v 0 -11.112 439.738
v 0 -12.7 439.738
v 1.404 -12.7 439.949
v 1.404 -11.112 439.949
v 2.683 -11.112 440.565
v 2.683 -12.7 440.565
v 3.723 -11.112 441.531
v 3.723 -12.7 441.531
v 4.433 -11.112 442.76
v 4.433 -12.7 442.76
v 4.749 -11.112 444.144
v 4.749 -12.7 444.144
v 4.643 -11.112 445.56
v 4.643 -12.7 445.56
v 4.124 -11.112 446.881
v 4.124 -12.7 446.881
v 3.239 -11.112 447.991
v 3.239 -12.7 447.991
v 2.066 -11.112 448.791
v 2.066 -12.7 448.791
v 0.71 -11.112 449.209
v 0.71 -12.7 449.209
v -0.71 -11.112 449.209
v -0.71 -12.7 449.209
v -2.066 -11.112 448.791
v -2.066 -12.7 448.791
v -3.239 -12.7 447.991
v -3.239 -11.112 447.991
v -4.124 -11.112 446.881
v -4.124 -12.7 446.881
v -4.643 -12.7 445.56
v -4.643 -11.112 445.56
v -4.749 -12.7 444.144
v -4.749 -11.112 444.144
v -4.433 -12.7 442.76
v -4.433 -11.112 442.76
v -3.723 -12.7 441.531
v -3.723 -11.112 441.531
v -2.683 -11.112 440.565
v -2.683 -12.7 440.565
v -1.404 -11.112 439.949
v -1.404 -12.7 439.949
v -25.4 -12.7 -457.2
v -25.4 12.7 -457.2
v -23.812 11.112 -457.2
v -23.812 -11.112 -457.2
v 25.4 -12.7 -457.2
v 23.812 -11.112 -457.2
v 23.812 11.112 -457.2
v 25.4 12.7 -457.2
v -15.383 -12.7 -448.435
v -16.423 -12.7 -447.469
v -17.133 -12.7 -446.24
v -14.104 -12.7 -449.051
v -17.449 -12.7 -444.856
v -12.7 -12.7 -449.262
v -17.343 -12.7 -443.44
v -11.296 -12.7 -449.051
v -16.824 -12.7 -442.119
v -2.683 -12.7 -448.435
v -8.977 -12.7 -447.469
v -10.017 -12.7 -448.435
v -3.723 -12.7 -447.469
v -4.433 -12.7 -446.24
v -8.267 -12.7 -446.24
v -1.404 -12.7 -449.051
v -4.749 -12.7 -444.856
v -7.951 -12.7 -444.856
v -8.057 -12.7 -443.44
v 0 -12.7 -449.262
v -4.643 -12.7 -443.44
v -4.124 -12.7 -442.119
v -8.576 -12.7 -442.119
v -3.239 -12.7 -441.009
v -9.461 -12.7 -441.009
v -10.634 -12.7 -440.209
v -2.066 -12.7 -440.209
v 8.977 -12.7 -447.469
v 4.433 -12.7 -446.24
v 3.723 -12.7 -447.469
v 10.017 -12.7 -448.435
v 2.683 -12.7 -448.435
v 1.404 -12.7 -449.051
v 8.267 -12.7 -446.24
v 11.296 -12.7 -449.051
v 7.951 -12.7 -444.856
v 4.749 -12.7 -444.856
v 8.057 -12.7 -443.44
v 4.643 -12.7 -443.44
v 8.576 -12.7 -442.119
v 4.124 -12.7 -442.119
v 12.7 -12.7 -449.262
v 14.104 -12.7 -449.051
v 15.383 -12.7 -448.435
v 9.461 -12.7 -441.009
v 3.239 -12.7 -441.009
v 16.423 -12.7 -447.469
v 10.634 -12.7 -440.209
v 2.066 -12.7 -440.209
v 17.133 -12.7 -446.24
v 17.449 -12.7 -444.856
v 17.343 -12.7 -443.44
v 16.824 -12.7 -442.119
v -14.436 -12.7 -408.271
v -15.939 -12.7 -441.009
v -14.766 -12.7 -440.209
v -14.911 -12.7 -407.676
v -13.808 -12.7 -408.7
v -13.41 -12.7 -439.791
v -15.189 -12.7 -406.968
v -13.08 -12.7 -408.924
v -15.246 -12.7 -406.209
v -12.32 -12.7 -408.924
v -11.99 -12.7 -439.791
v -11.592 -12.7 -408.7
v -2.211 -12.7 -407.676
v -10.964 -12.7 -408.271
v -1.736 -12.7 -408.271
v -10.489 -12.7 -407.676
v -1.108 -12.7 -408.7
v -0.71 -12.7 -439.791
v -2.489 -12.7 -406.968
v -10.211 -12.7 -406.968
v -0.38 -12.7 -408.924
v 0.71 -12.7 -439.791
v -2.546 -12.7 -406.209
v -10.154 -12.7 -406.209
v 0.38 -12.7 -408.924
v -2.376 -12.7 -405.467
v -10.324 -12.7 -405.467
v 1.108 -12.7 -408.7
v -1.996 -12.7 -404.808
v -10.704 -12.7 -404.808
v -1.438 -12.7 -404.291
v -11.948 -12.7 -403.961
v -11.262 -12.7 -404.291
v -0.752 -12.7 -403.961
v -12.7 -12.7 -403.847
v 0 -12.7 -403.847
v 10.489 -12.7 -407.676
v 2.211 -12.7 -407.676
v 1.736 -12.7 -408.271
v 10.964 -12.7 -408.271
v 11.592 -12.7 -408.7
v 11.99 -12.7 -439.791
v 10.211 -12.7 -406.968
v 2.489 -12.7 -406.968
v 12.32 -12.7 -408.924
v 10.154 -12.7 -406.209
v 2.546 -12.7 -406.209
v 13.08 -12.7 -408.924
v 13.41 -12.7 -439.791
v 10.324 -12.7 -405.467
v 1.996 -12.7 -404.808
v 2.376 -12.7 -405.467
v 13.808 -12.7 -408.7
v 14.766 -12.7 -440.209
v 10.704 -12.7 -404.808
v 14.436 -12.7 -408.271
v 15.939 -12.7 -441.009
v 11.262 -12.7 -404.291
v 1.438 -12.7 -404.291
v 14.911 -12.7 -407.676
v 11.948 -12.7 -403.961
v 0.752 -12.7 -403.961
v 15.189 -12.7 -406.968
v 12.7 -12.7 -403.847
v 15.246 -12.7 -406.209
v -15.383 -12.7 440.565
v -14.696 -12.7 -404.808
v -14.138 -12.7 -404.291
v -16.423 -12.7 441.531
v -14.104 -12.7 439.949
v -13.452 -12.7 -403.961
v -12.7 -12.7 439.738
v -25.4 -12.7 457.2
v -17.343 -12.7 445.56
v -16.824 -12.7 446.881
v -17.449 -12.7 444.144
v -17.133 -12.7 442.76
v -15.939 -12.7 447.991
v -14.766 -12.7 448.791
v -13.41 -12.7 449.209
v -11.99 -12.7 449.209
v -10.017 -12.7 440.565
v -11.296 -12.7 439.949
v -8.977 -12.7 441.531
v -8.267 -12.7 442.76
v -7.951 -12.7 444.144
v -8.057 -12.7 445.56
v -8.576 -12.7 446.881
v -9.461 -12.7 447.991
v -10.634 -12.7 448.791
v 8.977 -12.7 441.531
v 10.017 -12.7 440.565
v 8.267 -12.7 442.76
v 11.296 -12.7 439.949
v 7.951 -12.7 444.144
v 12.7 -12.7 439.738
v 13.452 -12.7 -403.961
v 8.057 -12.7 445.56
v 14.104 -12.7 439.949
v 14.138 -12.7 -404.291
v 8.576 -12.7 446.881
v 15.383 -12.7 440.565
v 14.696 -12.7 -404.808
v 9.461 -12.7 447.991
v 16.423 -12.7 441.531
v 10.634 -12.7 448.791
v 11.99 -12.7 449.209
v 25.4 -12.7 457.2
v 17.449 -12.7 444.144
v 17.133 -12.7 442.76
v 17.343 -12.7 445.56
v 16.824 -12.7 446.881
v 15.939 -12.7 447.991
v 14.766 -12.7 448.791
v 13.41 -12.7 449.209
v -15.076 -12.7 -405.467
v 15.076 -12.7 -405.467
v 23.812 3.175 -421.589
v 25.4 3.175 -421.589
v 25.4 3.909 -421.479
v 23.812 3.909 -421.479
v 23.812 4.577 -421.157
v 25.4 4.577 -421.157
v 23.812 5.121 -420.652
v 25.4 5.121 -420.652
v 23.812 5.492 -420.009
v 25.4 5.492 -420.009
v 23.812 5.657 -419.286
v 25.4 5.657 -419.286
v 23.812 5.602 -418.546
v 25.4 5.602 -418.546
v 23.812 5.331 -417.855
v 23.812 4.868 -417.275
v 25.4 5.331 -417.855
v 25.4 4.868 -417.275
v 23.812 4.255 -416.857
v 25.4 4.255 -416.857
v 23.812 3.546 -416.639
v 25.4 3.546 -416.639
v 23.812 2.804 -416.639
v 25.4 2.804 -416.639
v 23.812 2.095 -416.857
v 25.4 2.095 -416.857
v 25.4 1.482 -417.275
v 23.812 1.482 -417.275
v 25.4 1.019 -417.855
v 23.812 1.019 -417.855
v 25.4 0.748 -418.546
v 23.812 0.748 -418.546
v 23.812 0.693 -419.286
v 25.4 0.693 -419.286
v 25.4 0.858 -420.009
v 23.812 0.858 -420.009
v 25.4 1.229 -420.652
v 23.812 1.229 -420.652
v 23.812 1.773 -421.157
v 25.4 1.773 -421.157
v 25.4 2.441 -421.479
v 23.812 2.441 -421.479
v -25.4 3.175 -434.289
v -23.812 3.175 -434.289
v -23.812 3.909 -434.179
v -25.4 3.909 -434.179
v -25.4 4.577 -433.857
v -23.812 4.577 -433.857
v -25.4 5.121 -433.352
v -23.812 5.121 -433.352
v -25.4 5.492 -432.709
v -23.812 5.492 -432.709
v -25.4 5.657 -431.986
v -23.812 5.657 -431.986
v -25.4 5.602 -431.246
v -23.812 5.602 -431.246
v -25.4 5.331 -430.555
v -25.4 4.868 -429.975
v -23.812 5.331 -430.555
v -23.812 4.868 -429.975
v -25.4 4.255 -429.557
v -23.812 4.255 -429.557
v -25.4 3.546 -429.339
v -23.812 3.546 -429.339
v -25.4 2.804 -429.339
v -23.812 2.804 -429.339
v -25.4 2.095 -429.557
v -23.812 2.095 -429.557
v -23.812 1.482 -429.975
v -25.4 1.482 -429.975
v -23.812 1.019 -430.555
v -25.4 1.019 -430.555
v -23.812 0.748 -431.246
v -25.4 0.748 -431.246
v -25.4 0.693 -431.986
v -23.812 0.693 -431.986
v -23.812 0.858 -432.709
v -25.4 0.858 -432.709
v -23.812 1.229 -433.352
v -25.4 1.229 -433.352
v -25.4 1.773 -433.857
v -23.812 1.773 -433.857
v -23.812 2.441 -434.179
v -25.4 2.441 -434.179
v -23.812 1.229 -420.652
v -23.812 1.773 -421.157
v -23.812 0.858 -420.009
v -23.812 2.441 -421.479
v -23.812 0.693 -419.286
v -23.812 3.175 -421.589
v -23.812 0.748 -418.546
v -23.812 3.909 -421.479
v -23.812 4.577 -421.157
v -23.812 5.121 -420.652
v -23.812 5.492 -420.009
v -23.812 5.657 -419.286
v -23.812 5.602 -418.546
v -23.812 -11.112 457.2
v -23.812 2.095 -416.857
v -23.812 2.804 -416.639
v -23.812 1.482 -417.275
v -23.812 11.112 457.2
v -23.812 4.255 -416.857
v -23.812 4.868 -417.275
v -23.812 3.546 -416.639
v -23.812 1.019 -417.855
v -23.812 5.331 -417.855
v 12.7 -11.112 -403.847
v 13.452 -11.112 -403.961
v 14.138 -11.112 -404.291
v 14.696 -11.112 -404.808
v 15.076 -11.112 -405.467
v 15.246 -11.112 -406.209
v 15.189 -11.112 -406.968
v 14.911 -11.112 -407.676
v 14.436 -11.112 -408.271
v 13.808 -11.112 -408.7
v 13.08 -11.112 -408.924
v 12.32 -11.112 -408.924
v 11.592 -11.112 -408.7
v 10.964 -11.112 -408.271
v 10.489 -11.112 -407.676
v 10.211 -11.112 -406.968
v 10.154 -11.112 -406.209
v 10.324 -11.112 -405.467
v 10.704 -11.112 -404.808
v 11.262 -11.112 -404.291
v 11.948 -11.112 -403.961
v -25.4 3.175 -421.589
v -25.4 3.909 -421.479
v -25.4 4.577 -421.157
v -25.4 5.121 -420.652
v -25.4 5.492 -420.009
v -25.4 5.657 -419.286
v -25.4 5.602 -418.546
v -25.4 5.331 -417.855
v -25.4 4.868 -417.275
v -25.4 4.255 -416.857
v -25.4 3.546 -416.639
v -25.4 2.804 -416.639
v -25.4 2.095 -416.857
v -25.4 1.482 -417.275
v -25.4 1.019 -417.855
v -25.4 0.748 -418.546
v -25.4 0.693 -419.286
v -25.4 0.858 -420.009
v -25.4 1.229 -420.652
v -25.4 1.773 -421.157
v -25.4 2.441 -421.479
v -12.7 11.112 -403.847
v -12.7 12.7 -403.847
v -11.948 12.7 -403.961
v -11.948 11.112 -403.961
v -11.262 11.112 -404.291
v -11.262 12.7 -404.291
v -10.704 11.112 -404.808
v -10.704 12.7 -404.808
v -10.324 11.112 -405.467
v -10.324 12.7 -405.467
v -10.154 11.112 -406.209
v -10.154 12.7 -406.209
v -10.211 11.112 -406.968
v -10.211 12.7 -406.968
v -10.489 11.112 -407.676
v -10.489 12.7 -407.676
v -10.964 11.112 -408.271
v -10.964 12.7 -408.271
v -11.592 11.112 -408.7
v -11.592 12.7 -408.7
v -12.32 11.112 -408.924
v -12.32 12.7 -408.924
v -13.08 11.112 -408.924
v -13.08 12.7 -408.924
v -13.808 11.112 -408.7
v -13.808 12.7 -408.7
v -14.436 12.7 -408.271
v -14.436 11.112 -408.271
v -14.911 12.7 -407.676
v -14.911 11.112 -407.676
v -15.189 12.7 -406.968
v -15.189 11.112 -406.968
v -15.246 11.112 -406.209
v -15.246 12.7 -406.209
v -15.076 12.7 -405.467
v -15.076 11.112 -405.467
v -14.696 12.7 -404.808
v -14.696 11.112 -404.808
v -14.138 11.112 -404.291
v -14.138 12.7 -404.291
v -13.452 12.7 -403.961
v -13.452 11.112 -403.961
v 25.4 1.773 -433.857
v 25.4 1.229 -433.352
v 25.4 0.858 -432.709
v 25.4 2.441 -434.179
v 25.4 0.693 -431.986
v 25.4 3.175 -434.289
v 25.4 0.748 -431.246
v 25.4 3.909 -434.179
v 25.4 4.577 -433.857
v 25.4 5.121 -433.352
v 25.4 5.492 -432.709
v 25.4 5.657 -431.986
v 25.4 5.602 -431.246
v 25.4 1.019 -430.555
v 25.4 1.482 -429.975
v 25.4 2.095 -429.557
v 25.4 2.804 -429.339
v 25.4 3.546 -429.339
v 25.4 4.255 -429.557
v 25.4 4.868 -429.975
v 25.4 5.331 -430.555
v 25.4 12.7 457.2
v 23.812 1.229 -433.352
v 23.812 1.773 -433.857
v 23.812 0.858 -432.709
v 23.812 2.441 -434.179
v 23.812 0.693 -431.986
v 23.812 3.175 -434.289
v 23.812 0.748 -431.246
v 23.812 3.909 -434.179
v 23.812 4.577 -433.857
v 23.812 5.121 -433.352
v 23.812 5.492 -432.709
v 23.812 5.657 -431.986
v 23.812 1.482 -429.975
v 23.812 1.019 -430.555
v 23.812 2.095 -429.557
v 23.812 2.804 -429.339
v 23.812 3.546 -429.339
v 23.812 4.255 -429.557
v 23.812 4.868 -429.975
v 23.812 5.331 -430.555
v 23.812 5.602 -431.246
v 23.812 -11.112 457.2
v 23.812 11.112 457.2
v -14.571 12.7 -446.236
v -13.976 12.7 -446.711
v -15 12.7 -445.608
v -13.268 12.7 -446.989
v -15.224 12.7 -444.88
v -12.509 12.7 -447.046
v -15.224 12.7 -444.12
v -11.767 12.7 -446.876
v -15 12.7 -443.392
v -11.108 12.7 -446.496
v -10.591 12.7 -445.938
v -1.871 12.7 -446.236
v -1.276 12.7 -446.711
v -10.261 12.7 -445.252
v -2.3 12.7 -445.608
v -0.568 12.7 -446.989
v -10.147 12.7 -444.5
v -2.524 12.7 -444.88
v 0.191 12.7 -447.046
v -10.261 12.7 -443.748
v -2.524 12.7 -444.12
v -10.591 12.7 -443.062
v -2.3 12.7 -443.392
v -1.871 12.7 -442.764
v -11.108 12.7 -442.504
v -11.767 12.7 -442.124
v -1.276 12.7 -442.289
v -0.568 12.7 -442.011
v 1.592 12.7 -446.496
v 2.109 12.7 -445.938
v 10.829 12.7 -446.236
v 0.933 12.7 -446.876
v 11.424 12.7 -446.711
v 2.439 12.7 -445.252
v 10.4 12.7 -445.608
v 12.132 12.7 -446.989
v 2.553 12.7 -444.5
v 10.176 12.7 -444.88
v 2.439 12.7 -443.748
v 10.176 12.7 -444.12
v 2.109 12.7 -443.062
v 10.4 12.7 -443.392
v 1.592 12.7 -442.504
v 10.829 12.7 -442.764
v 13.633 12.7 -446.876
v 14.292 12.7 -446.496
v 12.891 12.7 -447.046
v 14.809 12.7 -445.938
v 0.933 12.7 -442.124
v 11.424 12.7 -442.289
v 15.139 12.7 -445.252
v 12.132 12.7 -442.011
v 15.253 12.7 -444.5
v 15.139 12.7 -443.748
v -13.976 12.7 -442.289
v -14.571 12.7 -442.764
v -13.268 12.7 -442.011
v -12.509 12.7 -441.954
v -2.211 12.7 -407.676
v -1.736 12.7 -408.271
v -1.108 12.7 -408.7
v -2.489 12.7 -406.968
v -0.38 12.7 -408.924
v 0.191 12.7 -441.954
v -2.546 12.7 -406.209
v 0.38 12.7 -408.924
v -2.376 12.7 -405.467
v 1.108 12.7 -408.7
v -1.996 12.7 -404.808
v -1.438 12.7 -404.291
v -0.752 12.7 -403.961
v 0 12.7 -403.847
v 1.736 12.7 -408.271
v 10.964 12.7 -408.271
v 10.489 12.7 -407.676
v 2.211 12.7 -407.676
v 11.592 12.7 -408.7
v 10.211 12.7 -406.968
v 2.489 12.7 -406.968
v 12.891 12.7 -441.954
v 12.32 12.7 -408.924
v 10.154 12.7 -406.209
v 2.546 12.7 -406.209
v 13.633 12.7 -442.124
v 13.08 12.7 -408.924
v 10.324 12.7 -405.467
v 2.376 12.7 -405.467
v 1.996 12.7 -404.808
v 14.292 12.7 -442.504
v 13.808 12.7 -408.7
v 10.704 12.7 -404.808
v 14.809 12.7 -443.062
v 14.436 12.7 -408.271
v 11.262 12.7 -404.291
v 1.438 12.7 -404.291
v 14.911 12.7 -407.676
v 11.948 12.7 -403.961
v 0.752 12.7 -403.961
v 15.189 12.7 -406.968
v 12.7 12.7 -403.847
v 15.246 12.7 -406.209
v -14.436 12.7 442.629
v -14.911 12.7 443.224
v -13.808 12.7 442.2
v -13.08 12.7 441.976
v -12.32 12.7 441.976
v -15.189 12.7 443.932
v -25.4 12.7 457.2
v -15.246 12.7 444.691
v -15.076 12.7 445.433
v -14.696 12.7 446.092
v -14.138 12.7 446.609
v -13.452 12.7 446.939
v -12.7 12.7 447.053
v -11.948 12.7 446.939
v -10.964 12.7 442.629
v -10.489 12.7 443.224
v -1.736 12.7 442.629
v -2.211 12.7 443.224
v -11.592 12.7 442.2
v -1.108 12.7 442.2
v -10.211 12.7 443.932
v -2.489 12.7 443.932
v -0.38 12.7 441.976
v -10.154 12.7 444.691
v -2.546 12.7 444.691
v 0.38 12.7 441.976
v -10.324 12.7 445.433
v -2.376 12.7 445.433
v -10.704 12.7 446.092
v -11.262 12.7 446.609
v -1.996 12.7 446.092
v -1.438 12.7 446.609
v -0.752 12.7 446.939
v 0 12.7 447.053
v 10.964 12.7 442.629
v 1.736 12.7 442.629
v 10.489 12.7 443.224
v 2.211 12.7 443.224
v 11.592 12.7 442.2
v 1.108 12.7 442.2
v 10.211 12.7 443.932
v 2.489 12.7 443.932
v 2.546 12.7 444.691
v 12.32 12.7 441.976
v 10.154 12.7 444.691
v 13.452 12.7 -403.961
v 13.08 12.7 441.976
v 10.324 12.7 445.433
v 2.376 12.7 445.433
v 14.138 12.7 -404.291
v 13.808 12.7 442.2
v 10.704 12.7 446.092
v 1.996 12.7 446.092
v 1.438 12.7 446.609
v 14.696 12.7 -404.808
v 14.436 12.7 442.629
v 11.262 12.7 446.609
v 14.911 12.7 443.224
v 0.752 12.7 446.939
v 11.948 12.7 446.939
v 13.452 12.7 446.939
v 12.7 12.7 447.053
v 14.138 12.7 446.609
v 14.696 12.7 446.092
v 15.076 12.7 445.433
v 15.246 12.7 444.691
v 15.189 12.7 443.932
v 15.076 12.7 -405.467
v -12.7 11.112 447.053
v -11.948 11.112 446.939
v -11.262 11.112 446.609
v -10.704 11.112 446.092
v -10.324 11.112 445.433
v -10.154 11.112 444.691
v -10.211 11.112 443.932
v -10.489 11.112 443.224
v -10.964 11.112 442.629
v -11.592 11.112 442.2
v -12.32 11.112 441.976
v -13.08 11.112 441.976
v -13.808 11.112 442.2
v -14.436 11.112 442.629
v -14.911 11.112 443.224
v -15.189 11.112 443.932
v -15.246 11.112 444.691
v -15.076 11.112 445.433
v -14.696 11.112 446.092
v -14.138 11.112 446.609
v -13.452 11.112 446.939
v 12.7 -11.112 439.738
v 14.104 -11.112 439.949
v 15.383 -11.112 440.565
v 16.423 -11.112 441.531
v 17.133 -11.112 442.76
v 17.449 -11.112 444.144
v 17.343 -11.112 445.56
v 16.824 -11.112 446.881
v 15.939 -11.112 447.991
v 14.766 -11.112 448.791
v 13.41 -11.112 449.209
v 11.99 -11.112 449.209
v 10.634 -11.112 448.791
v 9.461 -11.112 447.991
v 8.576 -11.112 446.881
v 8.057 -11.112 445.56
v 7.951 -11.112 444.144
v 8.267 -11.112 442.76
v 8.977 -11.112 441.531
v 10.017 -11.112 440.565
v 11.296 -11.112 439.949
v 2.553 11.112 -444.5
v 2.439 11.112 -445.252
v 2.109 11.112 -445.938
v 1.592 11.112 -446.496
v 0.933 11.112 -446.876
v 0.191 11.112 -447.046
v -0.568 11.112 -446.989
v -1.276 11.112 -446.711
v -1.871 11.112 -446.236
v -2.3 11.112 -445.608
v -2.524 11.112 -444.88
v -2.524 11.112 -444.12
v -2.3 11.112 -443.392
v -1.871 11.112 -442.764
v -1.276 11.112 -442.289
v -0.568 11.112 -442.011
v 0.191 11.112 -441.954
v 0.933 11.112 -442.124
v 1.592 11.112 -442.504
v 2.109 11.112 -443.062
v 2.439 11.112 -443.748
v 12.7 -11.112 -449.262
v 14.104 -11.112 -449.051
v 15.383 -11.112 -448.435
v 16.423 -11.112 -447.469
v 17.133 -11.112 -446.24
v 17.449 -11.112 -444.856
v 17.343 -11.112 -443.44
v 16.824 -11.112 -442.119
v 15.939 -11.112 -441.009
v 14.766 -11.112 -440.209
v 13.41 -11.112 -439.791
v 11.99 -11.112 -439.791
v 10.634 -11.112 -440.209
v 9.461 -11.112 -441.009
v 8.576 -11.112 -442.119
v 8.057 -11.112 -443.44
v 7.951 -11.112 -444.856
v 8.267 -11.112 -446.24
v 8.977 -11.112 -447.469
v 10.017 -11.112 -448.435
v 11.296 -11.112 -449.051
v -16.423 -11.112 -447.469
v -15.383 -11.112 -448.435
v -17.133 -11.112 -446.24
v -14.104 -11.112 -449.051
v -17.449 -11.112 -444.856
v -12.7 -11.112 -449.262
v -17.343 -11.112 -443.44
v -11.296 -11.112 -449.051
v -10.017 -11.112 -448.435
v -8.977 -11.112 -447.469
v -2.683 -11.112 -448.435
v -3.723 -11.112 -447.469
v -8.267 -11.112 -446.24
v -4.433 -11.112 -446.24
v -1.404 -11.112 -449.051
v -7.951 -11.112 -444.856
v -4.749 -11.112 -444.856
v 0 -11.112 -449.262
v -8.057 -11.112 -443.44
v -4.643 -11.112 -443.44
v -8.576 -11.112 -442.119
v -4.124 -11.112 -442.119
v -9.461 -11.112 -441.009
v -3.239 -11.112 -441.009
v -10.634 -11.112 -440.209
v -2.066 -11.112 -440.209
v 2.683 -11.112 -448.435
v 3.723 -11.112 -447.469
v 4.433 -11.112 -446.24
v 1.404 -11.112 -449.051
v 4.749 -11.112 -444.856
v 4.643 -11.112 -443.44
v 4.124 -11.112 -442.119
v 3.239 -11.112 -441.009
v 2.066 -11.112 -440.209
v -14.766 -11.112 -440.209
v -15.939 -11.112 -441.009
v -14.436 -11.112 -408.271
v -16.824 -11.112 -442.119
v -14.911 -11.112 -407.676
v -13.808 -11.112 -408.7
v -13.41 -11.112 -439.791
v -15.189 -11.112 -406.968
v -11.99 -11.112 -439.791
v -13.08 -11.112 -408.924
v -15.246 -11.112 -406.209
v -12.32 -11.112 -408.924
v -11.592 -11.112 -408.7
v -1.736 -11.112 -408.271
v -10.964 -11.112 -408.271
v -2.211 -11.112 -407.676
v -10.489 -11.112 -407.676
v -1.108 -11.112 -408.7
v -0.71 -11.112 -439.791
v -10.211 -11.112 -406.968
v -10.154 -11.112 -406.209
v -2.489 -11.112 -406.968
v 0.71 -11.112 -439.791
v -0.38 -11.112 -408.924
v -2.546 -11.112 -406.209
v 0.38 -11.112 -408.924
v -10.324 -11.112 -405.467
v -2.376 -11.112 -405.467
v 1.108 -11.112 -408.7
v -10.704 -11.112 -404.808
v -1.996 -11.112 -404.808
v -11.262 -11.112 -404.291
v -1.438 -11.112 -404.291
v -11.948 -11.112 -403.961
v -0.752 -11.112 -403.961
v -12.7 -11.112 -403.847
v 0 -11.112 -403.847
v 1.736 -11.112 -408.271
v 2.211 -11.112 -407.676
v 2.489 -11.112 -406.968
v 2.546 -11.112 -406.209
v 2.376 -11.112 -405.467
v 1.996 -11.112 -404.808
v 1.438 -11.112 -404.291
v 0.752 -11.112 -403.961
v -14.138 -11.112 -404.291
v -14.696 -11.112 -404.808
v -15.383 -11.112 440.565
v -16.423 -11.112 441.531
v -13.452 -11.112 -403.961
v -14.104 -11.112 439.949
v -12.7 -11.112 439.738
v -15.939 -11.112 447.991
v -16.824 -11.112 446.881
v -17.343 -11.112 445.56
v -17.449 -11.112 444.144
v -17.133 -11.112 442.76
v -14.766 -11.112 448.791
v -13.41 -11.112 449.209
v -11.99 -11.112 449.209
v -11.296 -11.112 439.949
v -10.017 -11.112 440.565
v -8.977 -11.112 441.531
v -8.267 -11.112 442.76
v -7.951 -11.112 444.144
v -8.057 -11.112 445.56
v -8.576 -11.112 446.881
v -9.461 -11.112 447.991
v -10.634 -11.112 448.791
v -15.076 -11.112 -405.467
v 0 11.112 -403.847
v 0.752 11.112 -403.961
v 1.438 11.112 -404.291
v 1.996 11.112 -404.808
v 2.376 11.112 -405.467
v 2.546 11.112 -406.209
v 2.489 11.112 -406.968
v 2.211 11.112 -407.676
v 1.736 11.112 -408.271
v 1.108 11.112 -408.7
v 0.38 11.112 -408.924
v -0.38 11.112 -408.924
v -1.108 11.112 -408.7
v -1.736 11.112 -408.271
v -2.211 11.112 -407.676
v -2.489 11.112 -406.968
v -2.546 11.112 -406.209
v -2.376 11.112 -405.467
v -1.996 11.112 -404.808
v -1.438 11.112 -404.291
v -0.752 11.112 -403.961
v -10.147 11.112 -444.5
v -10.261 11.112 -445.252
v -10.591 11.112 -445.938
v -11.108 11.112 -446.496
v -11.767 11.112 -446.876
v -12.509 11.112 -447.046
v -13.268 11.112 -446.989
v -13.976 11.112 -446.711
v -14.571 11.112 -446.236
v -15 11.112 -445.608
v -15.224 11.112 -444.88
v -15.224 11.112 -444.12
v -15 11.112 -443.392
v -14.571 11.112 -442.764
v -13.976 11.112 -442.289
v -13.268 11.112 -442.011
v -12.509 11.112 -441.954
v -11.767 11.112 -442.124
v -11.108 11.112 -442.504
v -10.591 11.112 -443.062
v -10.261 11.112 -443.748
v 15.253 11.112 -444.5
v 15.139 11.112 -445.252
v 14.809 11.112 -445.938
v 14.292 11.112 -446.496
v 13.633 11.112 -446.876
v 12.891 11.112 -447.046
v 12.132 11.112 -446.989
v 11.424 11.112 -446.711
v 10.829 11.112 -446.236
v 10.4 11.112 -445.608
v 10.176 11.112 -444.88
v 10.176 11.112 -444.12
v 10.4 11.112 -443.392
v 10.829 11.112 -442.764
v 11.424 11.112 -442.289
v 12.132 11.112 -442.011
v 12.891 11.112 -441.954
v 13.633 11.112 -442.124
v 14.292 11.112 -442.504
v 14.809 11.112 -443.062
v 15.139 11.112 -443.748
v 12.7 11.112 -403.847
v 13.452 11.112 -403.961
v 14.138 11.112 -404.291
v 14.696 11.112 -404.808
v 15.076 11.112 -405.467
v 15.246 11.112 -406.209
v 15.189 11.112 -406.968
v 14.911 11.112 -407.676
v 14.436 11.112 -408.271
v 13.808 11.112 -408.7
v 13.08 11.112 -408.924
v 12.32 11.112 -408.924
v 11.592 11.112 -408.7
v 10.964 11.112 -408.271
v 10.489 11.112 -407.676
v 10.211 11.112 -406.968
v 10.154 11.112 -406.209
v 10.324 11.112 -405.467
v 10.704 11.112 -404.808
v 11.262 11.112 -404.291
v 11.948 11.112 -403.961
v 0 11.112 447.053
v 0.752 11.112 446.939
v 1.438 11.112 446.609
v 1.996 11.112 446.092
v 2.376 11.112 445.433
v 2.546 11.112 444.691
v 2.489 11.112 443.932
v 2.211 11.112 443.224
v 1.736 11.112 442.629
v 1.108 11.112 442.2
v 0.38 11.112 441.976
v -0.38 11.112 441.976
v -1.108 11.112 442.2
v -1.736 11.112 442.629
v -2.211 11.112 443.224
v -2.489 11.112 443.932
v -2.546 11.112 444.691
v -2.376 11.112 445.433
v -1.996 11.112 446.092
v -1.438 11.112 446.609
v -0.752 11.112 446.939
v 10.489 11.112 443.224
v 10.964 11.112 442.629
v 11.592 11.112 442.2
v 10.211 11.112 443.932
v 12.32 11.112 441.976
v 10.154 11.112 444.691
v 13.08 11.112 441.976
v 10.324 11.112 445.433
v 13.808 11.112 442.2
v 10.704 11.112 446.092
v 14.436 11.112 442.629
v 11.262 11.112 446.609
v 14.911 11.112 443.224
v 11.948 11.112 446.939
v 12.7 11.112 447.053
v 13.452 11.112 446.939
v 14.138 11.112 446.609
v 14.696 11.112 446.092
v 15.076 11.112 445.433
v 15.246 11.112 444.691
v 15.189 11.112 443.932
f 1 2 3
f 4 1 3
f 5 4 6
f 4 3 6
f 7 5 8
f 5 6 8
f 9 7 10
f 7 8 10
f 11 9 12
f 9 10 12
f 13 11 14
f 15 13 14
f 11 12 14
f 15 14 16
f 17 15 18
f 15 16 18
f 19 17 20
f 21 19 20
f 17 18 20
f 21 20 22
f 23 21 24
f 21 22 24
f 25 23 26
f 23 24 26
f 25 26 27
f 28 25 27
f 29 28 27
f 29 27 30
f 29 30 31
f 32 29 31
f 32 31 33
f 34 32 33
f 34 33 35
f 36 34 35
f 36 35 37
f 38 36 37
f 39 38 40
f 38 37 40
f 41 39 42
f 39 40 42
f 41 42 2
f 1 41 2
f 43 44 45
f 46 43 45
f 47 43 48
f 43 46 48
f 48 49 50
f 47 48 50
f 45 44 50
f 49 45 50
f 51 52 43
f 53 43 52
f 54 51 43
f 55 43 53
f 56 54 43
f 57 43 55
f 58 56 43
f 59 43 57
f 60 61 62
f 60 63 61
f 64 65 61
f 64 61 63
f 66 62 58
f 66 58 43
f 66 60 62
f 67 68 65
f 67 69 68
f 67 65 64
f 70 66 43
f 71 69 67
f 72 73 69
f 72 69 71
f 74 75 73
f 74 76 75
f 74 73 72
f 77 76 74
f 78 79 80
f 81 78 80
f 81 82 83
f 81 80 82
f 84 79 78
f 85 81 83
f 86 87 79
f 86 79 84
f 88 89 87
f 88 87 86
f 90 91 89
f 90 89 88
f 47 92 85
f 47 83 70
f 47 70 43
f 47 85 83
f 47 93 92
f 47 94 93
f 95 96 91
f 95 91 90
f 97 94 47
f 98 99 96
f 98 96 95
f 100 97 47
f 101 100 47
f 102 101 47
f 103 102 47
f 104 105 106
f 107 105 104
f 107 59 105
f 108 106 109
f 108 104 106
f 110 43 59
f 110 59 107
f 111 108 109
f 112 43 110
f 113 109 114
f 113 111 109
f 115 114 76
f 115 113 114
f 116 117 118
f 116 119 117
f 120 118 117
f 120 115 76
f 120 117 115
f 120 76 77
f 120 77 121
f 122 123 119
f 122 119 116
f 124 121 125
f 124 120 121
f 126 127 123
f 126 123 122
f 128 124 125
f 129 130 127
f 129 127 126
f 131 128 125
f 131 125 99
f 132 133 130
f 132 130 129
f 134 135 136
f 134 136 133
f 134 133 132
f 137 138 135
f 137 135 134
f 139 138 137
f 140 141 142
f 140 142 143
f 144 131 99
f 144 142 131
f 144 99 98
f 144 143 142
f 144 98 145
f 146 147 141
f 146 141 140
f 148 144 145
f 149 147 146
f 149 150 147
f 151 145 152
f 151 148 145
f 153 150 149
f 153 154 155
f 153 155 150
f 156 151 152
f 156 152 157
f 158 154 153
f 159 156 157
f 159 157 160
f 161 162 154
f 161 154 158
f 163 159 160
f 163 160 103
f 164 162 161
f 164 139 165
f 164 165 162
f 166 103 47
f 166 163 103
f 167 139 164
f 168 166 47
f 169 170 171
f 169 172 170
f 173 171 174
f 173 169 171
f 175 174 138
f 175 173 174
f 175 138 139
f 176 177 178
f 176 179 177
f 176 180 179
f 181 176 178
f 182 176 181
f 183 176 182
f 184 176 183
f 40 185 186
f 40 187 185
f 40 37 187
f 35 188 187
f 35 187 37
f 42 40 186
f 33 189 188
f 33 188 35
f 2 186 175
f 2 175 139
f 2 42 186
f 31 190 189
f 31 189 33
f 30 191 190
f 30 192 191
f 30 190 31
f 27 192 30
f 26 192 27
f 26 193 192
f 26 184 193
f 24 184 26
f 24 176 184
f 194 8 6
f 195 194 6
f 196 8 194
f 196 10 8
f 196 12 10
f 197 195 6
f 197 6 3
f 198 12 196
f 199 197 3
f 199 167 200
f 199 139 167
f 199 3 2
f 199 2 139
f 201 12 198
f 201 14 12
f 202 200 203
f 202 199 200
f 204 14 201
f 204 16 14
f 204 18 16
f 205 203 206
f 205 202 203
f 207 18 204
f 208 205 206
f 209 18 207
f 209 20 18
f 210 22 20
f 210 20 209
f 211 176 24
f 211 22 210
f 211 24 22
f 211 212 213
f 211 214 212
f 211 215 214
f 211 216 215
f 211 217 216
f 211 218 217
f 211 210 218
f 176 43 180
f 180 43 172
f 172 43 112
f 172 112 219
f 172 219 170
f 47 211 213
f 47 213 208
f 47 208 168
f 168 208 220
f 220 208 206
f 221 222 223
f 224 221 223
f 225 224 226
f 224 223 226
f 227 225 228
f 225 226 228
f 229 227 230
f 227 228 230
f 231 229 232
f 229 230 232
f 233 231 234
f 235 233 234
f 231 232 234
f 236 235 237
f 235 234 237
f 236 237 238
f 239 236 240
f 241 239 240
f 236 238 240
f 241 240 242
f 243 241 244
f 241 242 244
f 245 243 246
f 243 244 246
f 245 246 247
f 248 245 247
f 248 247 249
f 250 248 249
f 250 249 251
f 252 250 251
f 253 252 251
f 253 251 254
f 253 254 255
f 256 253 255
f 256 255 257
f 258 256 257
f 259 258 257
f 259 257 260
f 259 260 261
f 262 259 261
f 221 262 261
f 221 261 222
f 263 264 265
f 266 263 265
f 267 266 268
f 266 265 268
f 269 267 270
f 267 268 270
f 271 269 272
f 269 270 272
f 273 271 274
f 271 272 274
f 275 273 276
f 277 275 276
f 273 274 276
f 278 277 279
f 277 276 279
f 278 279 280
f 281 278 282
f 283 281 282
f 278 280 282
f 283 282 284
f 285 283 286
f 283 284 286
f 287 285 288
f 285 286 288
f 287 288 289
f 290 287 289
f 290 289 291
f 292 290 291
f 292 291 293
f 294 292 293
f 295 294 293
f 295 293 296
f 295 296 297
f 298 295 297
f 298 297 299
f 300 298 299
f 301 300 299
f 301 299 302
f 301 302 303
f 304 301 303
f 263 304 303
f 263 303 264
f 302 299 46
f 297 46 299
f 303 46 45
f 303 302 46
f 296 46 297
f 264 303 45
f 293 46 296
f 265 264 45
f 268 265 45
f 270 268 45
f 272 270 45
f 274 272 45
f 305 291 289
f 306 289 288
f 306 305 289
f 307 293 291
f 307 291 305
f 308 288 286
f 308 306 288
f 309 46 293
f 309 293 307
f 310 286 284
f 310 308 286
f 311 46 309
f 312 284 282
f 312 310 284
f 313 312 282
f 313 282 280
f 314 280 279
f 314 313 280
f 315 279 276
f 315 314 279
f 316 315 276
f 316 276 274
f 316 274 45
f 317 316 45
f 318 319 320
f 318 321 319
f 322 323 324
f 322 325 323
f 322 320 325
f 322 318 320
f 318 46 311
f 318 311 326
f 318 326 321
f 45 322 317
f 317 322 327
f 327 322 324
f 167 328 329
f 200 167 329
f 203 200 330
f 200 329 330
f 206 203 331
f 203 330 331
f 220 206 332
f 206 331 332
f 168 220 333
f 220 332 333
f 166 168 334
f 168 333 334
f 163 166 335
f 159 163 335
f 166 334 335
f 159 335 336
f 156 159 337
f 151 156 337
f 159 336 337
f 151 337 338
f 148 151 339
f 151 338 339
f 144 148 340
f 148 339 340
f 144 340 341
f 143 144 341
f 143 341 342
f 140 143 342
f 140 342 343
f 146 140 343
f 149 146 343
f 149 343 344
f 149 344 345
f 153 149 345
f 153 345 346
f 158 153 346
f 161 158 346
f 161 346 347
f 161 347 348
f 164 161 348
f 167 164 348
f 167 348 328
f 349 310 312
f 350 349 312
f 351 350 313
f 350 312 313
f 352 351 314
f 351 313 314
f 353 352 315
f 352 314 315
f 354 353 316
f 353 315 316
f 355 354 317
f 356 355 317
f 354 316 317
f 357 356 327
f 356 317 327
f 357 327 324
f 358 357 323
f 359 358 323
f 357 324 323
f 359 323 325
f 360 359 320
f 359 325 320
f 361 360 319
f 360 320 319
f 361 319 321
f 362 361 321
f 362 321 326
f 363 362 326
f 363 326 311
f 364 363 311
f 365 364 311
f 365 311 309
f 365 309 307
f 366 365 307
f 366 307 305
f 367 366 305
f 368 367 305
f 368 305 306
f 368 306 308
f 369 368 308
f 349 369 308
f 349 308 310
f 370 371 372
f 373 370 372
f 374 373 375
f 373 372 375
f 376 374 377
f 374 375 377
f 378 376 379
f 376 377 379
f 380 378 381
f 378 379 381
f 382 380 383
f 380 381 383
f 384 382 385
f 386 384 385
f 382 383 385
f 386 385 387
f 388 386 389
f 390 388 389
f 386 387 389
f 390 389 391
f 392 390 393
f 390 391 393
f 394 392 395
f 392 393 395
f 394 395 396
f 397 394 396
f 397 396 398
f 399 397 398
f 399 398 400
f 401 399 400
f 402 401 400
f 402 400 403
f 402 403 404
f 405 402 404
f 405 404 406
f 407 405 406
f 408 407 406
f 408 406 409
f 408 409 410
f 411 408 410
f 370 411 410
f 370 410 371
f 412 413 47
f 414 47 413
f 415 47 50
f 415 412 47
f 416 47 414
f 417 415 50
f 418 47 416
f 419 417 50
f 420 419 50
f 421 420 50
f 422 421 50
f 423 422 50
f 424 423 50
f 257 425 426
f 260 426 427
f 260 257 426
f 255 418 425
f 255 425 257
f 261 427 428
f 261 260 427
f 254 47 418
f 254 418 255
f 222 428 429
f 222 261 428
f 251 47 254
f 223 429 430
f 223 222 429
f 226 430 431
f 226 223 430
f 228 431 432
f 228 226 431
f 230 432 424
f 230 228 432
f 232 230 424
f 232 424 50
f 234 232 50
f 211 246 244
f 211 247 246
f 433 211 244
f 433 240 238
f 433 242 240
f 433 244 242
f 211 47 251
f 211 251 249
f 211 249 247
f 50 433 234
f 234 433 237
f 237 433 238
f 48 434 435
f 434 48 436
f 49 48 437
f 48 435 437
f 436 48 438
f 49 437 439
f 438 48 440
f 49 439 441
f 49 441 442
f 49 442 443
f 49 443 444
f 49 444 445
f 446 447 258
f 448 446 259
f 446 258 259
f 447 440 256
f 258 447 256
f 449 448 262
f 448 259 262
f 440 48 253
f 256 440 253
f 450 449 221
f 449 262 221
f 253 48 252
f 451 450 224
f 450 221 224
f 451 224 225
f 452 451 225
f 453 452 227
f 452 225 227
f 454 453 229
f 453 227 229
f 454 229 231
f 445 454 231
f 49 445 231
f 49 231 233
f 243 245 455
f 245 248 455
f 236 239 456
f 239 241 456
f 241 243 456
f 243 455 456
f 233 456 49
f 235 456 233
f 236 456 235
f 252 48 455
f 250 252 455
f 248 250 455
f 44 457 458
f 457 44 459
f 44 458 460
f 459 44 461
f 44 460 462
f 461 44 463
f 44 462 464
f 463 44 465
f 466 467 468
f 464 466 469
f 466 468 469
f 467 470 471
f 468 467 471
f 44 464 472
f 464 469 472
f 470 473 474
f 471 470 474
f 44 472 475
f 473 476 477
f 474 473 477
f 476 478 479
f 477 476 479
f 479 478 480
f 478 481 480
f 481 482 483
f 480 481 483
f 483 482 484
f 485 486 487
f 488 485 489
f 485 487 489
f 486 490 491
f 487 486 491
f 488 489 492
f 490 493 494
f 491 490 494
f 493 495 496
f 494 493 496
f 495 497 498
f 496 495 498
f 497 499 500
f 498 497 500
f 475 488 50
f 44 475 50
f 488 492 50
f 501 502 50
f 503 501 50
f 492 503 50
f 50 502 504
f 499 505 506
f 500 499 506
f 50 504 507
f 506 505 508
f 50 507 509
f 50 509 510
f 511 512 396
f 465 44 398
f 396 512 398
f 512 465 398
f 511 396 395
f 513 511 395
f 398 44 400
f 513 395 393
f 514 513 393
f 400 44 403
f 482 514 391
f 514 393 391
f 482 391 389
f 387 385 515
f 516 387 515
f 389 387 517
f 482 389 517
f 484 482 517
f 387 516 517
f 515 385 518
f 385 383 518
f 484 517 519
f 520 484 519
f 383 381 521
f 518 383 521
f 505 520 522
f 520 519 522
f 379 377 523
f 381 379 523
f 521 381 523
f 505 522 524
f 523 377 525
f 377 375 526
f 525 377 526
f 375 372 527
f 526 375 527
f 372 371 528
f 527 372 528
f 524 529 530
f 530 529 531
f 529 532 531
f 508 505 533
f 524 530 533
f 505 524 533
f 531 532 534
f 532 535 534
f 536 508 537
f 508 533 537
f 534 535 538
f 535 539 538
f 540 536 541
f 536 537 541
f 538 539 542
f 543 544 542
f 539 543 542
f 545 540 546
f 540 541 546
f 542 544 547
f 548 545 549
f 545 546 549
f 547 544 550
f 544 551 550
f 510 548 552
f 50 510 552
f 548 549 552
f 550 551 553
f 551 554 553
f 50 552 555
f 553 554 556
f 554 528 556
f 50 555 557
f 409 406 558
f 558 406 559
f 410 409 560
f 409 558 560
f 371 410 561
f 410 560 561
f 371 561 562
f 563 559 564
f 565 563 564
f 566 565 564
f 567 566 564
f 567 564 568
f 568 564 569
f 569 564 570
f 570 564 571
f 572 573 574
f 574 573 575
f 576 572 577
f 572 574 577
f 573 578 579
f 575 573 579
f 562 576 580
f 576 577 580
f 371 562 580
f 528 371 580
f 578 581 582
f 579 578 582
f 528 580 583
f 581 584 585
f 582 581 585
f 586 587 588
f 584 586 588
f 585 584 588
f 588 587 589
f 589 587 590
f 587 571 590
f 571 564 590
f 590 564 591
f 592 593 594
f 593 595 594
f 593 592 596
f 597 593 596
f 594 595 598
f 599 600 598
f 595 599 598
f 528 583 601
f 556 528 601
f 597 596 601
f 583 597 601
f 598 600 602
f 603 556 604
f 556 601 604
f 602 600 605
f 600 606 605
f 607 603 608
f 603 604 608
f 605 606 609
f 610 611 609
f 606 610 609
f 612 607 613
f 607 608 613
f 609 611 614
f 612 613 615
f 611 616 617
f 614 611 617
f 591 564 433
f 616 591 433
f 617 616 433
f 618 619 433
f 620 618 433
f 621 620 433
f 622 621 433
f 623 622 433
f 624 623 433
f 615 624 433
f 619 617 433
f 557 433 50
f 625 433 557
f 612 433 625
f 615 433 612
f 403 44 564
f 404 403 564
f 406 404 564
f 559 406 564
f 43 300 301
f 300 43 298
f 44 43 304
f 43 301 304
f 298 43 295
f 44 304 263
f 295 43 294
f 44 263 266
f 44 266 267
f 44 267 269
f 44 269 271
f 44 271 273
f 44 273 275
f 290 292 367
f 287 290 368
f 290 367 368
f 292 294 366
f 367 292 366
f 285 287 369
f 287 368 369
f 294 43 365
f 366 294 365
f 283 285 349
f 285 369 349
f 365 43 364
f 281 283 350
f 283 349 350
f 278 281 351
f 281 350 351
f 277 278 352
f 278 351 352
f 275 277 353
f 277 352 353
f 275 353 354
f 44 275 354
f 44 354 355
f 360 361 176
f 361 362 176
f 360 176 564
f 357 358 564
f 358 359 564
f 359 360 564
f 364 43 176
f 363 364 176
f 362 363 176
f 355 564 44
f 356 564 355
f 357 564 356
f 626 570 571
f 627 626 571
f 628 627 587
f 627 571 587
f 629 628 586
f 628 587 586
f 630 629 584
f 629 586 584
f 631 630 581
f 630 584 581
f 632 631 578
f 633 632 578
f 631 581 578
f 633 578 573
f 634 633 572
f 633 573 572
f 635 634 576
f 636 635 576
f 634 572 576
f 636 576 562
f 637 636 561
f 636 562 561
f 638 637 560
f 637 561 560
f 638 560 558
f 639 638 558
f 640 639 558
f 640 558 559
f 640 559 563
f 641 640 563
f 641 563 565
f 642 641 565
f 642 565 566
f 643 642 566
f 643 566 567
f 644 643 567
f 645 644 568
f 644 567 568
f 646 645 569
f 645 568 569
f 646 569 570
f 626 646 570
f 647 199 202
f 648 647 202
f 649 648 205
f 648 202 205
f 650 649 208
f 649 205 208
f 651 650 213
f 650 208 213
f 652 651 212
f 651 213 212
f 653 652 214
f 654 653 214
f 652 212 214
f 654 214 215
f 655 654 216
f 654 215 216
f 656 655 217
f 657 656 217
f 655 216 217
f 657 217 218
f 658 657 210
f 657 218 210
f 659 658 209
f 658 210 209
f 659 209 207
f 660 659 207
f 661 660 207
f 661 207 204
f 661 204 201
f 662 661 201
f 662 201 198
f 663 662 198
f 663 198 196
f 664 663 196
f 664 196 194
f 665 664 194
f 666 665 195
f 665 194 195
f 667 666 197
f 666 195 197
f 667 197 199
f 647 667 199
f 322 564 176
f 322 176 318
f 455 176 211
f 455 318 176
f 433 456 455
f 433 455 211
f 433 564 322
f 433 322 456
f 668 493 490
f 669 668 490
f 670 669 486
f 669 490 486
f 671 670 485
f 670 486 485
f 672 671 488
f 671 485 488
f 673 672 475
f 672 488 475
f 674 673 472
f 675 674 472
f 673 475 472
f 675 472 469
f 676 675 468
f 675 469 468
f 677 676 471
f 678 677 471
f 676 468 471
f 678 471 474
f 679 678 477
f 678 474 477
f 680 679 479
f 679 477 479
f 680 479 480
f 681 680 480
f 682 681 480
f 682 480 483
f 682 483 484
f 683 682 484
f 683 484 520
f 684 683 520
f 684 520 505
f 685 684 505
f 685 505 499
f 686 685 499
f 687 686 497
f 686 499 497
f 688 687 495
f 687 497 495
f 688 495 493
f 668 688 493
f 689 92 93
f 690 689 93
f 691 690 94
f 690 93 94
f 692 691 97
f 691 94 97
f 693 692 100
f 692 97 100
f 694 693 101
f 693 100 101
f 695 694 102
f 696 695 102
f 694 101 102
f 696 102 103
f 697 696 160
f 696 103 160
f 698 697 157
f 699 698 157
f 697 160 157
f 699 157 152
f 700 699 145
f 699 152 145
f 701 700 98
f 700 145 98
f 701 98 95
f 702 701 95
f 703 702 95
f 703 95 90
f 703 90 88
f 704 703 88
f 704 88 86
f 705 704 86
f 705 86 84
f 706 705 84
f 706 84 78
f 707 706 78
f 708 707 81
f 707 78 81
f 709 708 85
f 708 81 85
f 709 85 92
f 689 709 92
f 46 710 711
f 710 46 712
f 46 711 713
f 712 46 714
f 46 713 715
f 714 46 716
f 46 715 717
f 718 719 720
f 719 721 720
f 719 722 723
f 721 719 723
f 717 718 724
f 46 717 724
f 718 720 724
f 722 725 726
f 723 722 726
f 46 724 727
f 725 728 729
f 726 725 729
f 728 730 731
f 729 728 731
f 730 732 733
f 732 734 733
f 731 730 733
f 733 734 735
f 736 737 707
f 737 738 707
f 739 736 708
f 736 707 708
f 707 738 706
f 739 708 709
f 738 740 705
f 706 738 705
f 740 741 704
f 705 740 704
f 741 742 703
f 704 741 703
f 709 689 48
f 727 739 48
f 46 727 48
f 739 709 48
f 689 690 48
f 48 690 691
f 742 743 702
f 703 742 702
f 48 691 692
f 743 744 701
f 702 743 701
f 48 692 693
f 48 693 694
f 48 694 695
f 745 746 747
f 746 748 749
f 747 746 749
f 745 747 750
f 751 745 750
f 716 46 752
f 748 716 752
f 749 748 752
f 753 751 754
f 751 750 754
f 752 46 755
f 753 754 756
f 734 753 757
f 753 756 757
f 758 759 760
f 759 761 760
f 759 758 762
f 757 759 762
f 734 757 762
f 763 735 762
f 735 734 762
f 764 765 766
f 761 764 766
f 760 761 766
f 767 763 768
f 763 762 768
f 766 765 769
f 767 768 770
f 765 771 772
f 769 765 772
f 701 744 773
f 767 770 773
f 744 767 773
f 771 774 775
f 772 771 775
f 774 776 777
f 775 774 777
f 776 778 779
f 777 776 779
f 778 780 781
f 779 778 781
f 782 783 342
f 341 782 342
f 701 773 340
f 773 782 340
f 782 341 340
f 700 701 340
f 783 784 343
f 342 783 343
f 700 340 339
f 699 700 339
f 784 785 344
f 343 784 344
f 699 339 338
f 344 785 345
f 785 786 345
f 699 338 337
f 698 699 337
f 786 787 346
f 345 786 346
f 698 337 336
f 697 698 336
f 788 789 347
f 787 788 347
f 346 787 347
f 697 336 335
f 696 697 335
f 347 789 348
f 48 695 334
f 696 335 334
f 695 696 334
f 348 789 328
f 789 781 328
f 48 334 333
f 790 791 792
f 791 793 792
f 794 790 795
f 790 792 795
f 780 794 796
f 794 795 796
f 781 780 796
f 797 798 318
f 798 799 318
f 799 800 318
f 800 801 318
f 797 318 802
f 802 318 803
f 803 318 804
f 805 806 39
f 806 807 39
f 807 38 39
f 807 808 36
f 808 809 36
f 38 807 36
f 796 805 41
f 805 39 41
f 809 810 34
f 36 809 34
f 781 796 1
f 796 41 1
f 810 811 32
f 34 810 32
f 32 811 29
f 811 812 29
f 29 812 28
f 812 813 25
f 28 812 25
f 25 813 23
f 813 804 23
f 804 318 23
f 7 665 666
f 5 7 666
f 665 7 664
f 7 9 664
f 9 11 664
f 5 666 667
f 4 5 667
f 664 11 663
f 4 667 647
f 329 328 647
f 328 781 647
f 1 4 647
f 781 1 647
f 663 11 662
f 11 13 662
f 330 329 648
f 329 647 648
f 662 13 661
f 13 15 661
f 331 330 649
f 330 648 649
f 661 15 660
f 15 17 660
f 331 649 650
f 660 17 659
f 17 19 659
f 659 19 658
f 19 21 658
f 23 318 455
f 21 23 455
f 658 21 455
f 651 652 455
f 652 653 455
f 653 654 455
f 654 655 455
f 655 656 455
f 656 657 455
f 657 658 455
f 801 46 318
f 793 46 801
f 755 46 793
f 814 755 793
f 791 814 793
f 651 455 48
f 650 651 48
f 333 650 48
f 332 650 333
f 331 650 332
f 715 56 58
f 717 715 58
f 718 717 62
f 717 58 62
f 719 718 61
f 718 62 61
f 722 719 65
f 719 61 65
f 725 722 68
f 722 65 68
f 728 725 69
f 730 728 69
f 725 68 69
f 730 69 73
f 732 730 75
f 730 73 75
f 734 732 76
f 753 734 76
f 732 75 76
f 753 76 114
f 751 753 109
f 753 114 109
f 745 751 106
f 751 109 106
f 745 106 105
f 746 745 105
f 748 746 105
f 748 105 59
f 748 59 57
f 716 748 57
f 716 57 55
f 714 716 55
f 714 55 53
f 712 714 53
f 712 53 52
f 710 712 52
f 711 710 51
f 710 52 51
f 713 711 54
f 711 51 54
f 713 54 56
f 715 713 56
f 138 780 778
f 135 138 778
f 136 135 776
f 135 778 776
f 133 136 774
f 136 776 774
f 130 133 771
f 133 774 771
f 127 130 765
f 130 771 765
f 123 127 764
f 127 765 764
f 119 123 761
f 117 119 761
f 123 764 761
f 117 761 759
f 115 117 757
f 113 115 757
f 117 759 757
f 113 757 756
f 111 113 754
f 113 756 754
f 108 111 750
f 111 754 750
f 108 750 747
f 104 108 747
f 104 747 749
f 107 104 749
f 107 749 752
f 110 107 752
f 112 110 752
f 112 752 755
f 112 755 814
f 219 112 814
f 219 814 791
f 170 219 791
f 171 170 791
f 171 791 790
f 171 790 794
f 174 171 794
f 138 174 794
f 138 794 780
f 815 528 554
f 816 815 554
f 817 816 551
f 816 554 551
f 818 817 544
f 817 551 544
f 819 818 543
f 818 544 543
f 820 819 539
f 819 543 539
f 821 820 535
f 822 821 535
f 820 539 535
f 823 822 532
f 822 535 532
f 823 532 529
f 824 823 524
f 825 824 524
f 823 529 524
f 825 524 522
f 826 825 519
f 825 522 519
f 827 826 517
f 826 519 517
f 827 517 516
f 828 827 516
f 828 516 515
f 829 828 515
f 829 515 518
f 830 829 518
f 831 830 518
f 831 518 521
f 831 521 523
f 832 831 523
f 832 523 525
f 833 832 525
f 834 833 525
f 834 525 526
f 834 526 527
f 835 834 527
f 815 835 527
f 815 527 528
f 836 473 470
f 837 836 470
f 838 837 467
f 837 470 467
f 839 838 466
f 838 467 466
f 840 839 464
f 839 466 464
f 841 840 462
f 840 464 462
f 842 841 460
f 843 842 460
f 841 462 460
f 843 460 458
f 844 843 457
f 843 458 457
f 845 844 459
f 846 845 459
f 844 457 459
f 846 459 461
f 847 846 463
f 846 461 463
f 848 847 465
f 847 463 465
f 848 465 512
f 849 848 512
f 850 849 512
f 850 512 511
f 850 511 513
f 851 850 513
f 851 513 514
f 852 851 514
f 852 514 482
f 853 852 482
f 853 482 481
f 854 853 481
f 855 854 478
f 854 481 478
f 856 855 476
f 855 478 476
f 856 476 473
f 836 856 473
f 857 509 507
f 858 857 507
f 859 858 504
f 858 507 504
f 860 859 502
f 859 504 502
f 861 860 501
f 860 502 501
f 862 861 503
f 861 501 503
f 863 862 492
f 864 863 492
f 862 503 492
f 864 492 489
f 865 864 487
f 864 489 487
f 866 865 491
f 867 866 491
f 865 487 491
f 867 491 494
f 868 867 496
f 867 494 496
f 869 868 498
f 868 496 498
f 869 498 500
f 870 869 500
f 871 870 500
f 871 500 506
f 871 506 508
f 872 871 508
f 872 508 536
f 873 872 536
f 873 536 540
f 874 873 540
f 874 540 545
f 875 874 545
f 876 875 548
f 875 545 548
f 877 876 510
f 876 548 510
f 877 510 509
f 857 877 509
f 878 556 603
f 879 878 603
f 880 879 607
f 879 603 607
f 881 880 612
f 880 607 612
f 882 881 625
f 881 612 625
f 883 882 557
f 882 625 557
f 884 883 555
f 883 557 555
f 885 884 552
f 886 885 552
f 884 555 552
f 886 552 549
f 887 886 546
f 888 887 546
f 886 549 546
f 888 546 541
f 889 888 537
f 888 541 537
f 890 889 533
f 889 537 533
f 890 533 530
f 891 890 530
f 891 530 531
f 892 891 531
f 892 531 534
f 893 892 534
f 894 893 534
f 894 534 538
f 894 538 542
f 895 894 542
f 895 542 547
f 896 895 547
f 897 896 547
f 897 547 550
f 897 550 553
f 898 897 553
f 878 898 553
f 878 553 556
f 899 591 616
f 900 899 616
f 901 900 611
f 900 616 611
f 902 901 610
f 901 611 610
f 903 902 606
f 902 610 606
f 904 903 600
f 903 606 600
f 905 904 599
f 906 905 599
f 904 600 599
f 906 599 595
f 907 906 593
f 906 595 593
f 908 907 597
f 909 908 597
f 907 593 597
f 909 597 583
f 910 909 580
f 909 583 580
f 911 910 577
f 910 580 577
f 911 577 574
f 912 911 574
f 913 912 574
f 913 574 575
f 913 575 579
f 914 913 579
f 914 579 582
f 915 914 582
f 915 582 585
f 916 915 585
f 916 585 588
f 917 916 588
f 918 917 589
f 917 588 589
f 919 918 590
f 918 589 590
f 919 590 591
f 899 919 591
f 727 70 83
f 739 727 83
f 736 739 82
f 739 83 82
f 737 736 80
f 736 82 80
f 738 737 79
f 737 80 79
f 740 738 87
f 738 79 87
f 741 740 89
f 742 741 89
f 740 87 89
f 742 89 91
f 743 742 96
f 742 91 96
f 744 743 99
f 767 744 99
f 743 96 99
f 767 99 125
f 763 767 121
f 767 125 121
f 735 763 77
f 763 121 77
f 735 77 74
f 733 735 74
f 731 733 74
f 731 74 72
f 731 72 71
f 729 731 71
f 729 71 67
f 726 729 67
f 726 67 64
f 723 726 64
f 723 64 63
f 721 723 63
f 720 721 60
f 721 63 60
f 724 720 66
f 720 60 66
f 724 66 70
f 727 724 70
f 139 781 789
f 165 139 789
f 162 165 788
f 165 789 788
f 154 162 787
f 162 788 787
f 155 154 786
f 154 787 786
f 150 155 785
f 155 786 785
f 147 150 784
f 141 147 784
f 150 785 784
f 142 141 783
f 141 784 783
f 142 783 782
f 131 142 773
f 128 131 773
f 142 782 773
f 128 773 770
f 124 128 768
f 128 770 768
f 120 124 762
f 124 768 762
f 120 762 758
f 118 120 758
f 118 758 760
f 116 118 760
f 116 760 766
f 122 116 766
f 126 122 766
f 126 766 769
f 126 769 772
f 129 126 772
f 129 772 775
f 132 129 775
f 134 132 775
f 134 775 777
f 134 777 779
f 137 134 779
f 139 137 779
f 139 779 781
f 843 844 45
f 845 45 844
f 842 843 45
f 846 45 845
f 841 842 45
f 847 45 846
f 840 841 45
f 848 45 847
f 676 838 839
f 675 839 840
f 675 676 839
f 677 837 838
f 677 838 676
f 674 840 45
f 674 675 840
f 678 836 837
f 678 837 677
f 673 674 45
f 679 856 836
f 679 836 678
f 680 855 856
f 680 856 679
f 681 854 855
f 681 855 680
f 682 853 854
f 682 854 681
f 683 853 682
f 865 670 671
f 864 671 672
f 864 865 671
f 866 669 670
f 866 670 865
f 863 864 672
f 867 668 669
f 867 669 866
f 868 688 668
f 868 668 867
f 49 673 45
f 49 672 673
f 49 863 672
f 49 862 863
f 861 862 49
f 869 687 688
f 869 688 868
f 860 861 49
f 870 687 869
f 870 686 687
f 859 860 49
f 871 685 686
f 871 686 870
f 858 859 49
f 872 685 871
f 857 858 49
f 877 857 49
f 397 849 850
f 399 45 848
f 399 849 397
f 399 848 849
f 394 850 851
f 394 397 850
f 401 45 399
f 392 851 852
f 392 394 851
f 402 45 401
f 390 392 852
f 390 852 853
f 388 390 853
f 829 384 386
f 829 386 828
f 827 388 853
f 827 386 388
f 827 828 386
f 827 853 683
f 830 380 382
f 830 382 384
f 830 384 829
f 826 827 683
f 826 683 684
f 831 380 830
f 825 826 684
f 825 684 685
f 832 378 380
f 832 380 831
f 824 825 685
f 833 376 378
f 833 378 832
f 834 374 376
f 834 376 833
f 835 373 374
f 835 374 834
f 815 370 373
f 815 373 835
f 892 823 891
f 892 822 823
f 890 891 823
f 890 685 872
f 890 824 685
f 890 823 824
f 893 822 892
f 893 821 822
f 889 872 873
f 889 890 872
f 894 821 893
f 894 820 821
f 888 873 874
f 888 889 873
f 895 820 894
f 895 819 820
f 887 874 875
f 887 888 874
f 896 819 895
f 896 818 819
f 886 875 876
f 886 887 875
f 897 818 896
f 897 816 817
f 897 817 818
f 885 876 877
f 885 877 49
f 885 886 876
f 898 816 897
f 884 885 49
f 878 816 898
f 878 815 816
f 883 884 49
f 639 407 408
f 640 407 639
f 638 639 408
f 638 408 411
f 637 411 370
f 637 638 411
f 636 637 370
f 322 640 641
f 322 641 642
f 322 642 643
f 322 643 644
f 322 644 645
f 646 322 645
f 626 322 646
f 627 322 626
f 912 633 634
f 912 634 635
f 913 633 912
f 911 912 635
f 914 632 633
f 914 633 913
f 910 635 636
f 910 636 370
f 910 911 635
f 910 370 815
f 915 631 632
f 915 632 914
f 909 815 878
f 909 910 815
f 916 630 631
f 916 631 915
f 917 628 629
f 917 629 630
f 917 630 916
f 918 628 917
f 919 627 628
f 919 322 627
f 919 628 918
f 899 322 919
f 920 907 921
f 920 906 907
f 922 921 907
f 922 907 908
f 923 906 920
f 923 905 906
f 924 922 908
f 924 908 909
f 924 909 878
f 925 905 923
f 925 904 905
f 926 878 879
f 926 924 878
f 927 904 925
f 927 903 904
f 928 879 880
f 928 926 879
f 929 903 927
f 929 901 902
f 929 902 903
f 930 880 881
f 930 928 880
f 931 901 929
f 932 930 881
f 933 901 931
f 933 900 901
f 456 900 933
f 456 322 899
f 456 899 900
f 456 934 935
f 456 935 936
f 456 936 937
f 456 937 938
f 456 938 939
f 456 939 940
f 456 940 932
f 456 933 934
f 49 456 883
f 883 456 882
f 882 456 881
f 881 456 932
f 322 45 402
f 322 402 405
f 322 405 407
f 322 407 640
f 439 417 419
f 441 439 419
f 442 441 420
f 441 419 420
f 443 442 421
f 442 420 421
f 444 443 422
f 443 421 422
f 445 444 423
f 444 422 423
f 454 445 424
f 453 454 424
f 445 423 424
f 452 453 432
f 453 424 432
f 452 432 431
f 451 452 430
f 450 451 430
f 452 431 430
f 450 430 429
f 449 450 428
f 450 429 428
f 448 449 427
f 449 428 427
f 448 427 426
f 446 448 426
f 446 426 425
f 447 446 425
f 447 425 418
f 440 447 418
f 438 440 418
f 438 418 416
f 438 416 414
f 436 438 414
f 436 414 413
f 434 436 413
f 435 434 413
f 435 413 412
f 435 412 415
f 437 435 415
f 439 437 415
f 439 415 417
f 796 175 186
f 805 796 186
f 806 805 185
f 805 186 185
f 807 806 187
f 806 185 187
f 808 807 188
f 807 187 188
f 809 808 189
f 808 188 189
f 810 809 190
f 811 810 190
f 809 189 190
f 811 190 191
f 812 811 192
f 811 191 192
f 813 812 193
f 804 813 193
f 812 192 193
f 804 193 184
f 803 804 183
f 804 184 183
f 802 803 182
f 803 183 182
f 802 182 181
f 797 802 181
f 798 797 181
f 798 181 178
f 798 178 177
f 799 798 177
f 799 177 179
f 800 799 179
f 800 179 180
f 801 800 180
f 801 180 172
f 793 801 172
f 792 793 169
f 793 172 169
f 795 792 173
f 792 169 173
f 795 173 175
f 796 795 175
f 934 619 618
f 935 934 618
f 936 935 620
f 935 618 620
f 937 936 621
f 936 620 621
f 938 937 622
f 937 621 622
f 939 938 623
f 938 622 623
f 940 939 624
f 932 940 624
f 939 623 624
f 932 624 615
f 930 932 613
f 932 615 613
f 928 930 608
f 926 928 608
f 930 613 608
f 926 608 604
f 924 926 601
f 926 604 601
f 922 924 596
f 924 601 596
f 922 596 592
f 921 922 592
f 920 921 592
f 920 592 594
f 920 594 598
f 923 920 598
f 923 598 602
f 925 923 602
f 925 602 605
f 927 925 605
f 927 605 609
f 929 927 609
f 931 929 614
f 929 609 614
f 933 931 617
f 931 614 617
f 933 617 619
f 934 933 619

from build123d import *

# Parameters (mm, degrees)
SKETCH1_W           = 50.8
SKETCH1_H           = 25.4
SKETCH1_W_2         = 47.625
SKETCH1_H_2         = 22.225
BOSS_EXTRUDE1_DEPTH = 457.2
SKETCH3_R           = 2.5527
CUT_EXTRUDE2_DEPTH  = 1.5875
SKETCH4_R           = 4.7625
SKETCH4_R_2         = 2.5527
CUT_EXTRUDE4_DEPTH  = 1.5875
SKETCH7_R           = 2.4892
CUT_EXTRUDE5_DEPTH  = 461.188841673
SKETCH10_R          = 2.5527
CUT_EXTRUDE6_DEPTH  = 459.608940166


with BuildPart() as part:
    # Sketch1 → Boss-Extrude1 (new, symmetric)
    with BuildSketch(Plane.XY):
        Rectangle(SKETCH1_W, SKETCH1_H)
        Rectangle(SKETCH1_W_2, SKETCH1_H_2, mode=Mode.SUBTRACT)
    extrude(amount=BOSS_EXTRUDE1_DEPTH, both=True)

    # Sketch3 → Cut-Extrude2 (cut)
    with BuildSketch(Plane(origin=(0, 12.7, 0), x_dir=(1, 0, 0), z_dir=(0, 1, 0))):
        with Locations(Location((0, -444.5, 0), (0, 0, 270))):
            Circle(SKETCH3_R)
        with Locations(Location((12.7, -444.5, 0), (0, 0, 270))):
            Circle(SKETCH3_R)
        with Locations(Location((-12.7, -444.5, 0), (0, 0, 270))):
            Circle(SKETCH3_R)
        with Locations((12.7, 444.5)):
            Circle(SKETCH3_R)
        with Locations((0, 444.5)):
            Circle(SKETCH3_R)
        with Locations((-12.7, 444.5)):
            Circle(SKETCH3_R)
    extrude(amount=-CUT_EXTRUDE2_DEPTH, mode=Mode.SUBTRACT)

    # Sketch4 → Cut-Extrude4 (cut)
    with BuildSketch(Plane.XZ.offset(12.7)):
        with Locations(Location((-12.7, 444.5, 0), (0, 0, 270))):
            Circle(SKETCH4_R)
        with Locations(Location((-12.7, 444.5, 0), (0, 0, 90))):
            Circle(SKETCH4_R_2, mode=Mode.SUBTRACT)
        with Locations(Location((0, 444.5, 0), (0, 0, 270))):
            Circle(SKETCH4_R)
        with Locations(Location((0, 444.5, 0), (0, 0, 90))):
            Circle(SKETCH4_R_2, mode=Mode.SUBTRACT)
        with Locations(Location((0, 444.5, 0), (0, 0, 90))):
            Circle(SKETCH4_R_2)
        with Locations(Location((-12.7, 444.5, 0), (0, 0, 90))):
            Circle(SKETCH4_R_2)
        with Locations(Location((12.7, 444.5, 0), (0, 0, 270))):
            Circle(SKETCH4_R)
        with Locations(Location((12.7, 444.5, 0), (0, 0, 90))):
            Circle(SKETCH4_R_2, mode=Mode.SUBTRACT)
        with Locations(Location((12.7, 444.5, 0), (0, 0, 90))):
            Circle(SKETCH4_R_2)
        with Locations(Location((12.7, -444.5, 0), (0, 0, 270))):
            Circle(SKETCH4_R)
        with Locations((12.7, -444.5)):
            Circle(SKETCH4_R_2, mode=Mode.SUBTRACT)
        with Locations((12.7, -444.5)):
            Circle(SKETCH4_R_2)
        with Locations(Location((0, -444.5, 0), (0, 0, 270))):
            Circle(SKETCH4_R)
        with Locations((0, -444.5)):
            Circle(SKETCH4_R_2, mode=Mode.SUBTRACT)
        with Locations((0, -444.5)):
            Circle(SKETCH4_R_2)
        with Locations(Location((-12.7, -444.5, 0), (0, 0, 270))):
            Circle(SKETCH4_R)
        with Locations((-12.7, -444.5)):
            Circle(SKETCH4_R_2, mode=Mode.SUBTRACT)
        with Locations((-12.7, -444.5)):
            Circle(SKETCH4_R_2)
    extrude(amount=-CUT_EXTRUDE4_DEPTH, mode=Mode.SUBTRACT)

    # Sketch7 → Cut-Extrude5 (cut, through all)
    with BuildSketch(Plane(origin=(25.4, 0, 0), x_dir=(0, 0, -1), z_dir=(1, 0, 0))):
        with Locations((419.1, 3.175)):
            Circle(SKETCH7_R)
        with Locations((431.8, 3.175)):
            Circle(SKETCH7_R)
    extrude(amount=-CUT_EXTRUDE5_DEPTH, mode=Mode.SUBTRACT)

    # Sketch10 → Cut-Extrude6 (cut, through all)
    with BuildSketch(Plane(origin=(0, 12.7, 0), x_dir=(1, 0, 0), z_dir=(0, 1, 0))):
        with Locations(Location((-12.7, 406.4, 0), (0, 0, 270))):
            Circle(SKETCH10_R)
        with Locations(Location((0, 406.4, 0), (0, 0, 270))):
            Circle(SKETCH10_R)
        with Locations(Location((12.7, 406.4, 0), (0, 0, 270))):
            Circle(SKETCH10_R)
    extrude(amount=-CUT_EXTRUDE6_DEPTH, mode=Mode.SUBTRACT)


solid = part.part
